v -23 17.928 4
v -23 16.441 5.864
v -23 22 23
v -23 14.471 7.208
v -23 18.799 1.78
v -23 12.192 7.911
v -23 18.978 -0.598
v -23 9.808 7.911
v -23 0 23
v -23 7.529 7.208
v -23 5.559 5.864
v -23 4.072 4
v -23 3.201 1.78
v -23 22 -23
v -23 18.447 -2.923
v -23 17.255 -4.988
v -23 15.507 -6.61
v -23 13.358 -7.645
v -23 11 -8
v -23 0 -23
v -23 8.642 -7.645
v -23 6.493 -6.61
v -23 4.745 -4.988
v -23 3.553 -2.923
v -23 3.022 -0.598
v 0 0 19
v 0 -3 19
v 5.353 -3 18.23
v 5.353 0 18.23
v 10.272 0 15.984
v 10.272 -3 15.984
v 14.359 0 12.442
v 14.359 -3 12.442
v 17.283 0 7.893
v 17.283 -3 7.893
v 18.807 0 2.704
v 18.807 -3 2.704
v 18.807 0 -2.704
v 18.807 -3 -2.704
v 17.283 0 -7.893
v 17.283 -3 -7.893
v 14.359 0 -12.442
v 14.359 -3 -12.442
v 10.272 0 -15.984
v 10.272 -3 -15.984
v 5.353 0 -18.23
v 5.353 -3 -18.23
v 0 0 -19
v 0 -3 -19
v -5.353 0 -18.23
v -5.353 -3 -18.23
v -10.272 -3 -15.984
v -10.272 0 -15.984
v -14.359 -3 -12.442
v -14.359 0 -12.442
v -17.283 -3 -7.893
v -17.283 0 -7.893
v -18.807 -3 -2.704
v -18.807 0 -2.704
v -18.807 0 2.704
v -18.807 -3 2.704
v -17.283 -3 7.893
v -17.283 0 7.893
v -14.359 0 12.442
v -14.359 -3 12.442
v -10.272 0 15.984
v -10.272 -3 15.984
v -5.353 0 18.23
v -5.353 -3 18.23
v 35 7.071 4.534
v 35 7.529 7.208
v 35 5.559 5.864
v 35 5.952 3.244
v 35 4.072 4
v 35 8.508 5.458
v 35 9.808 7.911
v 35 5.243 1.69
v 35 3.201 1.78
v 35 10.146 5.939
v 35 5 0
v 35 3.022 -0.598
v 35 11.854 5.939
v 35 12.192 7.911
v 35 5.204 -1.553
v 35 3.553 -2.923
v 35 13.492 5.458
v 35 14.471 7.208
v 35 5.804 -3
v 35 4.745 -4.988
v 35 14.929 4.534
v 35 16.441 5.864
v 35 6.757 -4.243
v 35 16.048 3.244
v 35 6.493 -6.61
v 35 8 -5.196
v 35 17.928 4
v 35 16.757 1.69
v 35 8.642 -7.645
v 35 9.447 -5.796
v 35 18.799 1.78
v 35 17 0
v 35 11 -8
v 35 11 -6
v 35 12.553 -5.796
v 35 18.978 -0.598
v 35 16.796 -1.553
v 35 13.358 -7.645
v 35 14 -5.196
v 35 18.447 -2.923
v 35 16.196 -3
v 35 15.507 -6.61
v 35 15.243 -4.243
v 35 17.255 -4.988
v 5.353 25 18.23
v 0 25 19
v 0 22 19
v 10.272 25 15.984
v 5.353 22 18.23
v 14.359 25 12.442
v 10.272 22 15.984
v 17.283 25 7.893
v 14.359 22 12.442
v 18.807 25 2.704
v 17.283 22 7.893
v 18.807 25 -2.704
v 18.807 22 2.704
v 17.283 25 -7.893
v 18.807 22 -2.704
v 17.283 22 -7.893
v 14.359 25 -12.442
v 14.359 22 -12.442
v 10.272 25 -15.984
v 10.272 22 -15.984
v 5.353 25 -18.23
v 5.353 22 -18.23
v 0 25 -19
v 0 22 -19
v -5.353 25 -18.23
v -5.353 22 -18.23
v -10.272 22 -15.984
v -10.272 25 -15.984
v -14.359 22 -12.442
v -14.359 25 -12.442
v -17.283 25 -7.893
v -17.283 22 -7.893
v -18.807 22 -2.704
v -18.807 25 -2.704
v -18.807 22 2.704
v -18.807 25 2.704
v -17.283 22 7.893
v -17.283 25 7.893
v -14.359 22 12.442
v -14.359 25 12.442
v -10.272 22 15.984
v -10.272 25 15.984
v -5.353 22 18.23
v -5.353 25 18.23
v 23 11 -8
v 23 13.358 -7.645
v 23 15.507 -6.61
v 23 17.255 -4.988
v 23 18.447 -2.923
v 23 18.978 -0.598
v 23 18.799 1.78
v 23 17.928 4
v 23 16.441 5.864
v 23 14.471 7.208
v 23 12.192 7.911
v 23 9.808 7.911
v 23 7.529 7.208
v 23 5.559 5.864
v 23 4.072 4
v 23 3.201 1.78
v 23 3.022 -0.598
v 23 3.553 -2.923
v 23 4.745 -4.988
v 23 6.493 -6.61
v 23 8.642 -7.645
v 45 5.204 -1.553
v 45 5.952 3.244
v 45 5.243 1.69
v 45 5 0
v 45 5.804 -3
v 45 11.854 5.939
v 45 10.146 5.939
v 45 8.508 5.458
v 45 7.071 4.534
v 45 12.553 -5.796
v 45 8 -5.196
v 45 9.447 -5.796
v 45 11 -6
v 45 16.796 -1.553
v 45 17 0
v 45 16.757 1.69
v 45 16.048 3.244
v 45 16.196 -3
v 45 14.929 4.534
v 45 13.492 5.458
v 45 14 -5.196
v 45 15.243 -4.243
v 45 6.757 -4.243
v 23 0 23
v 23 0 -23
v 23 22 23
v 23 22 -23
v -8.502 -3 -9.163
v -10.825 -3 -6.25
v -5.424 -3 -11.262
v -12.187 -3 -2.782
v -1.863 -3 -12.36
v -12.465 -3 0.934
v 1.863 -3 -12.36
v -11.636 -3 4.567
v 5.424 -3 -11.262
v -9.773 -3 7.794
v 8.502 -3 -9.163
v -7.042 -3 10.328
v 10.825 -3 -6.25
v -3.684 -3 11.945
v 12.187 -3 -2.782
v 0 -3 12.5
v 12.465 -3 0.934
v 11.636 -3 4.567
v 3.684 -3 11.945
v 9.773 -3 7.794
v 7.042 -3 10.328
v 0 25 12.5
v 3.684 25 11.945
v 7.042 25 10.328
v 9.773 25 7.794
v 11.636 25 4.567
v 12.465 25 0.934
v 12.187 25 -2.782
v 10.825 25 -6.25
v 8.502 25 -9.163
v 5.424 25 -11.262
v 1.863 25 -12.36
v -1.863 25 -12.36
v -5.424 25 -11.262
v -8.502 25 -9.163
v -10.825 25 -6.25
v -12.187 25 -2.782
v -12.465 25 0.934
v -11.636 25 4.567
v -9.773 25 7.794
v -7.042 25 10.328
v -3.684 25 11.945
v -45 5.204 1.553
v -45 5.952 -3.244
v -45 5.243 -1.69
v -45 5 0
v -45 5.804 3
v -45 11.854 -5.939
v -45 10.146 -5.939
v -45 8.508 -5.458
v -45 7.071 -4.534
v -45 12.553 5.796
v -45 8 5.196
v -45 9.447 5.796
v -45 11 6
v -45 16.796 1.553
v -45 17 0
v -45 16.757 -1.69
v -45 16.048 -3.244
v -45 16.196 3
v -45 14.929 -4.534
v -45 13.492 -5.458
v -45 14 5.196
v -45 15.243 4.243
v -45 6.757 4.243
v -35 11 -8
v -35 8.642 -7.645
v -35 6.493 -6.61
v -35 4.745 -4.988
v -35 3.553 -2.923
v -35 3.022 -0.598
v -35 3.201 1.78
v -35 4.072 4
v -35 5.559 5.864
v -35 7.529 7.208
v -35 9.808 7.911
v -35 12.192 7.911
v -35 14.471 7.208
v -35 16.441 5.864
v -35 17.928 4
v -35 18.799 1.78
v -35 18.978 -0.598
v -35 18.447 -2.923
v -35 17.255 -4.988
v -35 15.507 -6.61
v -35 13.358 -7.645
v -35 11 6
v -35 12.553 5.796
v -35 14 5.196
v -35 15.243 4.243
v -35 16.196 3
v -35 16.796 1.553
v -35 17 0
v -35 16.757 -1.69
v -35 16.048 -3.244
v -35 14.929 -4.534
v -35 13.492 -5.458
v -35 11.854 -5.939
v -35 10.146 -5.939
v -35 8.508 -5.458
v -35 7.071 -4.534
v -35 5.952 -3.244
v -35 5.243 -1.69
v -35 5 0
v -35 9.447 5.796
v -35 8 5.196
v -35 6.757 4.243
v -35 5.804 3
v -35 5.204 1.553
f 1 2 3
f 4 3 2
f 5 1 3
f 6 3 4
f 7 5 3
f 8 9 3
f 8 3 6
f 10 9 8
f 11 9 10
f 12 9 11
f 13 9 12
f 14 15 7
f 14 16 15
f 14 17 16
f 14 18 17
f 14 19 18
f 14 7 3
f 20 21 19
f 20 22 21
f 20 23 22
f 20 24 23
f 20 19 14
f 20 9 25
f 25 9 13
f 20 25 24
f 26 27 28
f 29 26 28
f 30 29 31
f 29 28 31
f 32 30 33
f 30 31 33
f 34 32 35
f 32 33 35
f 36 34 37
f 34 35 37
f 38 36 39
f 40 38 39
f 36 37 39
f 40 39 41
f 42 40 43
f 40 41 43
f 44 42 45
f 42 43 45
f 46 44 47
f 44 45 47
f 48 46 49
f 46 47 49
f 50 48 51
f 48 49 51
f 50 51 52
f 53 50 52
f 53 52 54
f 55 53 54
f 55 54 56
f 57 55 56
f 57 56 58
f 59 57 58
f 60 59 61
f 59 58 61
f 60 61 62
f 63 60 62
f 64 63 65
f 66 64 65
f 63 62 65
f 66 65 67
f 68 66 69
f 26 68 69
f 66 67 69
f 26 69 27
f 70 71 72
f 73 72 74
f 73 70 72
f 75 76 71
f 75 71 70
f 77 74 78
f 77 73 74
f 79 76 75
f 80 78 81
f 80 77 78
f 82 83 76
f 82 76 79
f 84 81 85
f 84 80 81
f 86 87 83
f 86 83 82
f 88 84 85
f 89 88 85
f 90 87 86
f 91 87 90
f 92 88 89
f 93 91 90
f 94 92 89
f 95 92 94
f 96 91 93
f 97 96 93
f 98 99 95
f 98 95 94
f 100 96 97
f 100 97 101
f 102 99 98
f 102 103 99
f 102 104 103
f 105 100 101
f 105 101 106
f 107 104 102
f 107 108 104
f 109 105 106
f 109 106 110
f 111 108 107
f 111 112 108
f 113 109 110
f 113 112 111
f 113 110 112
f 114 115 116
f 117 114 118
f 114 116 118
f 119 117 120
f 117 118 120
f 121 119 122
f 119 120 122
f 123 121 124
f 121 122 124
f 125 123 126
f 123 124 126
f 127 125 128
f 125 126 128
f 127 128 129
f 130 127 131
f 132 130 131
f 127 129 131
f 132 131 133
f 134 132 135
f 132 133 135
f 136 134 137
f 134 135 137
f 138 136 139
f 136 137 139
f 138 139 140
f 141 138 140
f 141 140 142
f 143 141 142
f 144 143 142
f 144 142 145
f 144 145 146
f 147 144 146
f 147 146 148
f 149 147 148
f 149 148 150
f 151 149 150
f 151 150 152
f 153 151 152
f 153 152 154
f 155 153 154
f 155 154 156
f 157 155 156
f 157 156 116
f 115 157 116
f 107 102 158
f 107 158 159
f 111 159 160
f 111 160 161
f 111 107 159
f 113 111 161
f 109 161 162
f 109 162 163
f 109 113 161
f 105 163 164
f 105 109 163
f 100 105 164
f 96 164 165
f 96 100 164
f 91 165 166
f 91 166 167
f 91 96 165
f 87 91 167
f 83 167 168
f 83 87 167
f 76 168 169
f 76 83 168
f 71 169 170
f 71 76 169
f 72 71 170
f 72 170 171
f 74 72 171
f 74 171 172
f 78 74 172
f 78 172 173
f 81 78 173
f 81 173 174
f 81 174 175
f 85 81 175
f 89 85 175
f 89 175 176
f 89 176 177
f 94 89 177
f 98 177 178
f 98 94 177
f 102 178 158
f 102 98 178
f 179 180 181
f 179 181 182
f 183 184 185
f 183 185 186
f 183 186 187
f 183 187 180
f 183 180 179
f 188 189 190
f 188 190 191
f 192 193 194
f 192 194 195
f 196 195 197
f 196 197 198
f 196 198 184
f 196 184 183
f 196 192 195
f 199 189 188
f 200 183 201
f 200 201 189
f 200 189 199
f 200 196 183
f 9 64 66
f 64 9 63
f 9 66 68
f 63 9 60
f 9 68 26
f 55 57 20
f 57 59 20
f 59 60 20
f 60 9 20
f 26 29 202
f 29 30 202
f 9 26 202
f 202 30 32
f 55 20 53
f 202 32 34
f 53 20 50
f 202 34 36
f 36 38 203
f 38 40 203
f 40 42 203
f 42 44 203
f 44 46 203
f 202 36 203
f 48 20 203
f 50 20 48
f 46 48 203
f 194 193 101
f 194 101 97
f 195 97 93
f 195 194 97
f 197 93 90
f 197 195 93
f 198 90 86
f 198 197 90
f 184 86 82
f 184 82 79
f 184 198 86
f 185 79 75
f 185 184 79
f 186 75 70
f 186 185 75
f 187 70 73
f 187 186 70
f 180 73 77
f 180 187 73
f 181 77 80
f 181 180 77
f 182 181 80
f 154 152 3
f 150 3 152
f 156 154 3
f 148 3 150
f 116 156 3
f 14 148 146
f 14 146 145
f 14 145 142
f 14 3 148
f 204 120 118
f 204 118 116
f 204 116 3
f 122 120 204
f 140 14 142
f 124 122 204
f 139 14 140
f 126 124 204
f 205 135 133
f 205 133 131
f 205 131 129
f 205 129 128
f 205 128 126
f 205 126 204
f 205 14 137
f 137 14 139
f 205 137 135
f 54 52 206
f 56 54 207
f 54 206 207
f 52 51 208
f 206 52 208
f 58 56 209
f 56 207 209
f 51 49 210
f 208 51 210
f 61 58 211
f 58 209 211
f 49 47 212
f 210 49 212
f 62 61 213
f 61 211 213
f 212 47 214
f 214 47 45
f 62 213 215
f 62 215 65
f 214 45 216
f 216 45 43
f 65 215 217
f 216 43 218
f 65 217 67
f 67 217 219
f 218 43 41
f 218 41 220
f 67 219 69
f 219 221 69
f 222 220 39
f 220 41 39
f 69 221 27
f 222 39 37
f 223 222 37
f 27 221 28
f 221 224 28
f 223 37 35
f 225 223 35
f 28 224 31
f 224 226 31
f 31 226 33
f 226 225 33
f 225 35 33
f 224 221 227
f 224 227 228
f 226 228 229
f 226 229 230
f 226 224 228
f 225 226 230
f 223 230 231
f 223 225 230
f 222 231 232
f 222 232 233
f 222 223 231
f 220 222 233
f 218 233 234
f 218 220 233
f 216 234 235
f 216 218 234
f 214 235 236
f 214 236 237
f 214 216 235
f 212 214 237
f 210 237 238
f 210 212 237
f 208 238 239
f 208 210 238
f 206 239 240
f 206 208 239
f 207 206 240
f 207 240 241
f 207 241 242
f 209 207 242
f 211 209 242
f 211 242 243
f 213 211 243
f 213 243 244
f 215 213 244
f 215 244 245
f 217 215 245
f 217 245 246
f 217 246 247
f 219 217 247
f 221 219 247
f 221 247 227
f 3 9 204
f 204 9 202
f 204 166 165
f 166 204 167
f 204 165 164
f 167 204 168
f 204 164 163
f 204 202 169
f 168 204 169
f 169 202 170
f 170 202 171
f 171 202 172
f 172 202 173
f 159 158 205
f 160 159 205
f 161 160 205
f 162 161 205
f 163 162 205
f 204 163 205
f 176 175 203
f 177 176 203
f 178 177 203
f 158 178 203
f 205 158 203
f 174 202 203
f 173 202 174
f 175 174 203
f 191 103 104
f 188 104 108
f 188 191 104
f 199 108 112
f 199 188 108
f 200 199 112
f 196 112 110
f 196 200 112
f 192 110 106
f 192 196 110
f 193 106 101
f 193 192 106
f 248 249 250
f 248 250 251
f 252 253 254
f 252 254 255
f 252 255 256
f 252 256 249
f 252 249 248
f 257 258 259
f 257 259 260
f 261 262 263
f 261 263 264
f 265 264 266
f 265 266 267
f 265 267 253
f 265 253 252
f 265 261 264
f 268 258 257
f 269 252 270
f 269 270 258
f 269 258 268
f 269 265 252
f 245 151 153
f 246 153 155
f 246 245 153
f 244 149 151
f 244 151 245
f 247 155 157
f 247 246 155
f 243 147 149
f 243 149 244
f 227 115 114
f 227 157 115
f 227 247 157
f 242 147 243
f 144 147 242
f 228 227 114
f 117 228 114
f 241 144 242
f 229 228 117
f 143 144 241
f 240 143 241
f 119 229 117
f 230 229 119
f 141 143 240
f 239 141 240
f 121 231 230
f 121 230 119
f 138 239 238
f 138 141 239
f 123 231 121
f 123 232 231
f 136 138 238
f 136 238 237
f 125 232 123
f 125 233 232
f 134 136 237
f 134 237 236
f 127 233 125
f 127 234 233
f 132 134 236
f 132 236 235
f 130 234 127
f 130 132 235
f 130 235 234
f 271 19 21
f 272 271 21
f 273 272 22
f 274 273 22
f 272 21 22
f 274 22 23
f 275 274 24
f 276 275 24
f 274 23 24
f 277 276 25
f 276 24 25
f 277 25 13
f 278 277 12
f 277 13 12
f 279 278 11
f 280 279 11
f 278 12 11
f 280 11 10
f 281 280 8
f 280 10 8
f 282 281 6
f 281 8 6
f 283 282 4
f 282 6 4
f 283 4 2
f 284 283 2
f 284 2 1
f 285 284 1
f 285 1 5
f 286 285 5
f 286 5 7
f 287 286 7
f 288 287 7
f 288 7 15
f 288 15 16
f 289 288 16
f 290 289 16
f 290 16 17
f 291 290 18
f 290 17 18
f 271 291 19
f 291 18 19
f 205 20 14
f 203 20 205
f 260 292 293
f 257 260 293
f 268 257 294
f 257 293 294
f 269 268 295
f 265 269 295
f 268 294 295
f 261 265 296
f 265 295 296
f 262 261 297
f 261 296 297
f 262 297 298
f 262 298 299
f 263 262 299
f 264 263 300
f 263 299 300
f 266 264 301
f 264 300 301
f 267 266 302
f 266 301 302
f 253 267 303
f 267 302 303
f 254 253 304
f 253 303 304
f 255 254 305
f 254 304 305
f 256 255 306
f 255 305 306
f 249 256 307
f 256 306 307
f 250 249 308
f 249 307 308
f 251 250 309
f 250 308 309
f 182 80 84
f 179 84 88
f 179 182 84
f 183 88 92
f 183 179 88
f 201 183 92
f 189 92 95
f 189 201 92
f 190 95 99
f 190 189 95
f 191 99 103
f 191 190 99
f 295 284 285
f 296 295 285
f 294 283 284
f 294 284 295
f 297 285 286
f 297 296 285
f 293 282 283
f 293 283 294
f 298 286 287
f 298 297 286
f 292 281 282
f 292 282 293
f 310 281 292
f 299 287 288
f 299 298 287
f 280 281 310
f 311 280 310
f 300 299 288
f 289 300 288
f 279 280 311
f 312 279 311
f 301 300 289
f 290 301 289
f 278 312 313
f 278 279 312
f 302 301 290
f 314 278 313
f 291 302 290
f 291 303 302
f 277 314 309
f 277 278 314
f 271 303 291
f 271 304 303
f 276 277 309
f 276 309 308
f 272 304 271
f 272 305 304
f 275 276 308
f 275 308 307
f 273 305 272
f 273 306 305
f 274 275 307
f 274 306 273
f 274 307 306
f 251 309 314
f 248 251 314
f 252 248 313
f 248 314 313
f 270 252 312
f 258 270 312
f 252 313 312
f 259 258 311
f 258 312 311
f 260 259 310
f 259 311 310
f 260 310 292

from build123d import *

# Parameters (mm, degrees)
ESBO_O1_W                 = 46
ESBO_O1_H                 = 46
ESBO_O1_R                 = 12.5
RESSALTO_EXTRUS_O1_DEPTH  = 22
ESBO_O1_7_R               = 19
ESBO_O1_7_R_2             = 12.5
RESSALTO_EXTRUS_O4_DEPTH  = 25
RESSALTO_EXTRUS_O5_START  = -3
ESBO_O1_8_R               = 19
ESBO_O1_8_R_2             = 12.5
RESSALTO_EXTRUS_O5_DEPTH  = 3
ESBO_O7_R                 = 8
ESBO_O7_R_2               = 6
RESSALTO_EXTRUS_O8_DEPTH  = 12
ESBO_O7_3_R               = 6
RESSALTO_EXTRUS_O9_DEPTH  = 22
RESSALTO_EXTRUS_O10_START = 12
ESBO_O8_R                 = 8
ESBO_O8_R_2               = 6
RESSALTO_EXTRUS_O10_DEPTH = 12
RESSALTO_EXTRUS_O11_START = 22
ESBO_O8_2_R               = 6
RESSALTO_EXTRUS_O11_DEPTH = 22


with BuildPart() as part:
    # Esboço1 → Ressalto-extrusão1 (new body)
    with BuildSketch(Plane(origin=(0, 0, 0), x_dir=(1, 0, 0), z_dir=(0, 1, 0))):
        Rectangle(ESBO_O1_W, ESBO_O1_H)
        Circle(ESBO_O1_R, mode=Mode.SUBTRACT)
    extrude(amount=RESSALTO_EXTRUS_O1_DEPTH)

    # Esboço1<7> → Ressalto-extrusão4 (add)
    with BuildSketch(Plane(origin=(0, 0, 0), x_dir=(1, 0, 0), z_dir=(0, 1, 0))):
        Circle(ESBO_O1_7_R)
        Circle(ESBO_O1_7_R_2, mode=Mode.SUBTRACT)
    extrude(amount=RESSALTO_EXTRUS_O4_DEPTH)

    # Esboço1<8> → Ressalto-extrusão5 (add)
    with BuildSketch(Plane(origin=(0, 0, 0), x_dir=(1, 0, 0), z_dir=(0, 1, 0)).offset(RESSALTO_EXTRUS_O5_START)):
        Circle(ESBO_O1_8_R)
        Circle(ESBO_O1_8_R_2, mode=Mode.SUBTRACT)
    extrude(amount=RESSALTO_EXTRUS_O5_DEPTH)

    # Esboço7 → Ressalto-extrusão8 (add)
    with BuildSketch(Plane.ZY.offset(23)):
        with Locations((0, 11)):
            Circle(ESBO_O7_R)
        with Locations((0, 11)):
            Circle(ESBO_O7_R_2, mode=Mode.SUBTRACT)
    extrude(amount=RESSALTO_EXTRUS_O8_DEPTH)

    # Esboço7<3> → Ressalto-extrusão9 (add)
    with BuildSketch(Plane.ZY.offset(23)):
        with Locations((0, 11)):
            Circle(ESBO_O7_3_R)
    extrude(amount=RESSALTO_EXTRUS_O9_DEPTH)

    # Esboço8 → Ressalto-extrusão10 (add)
    with BuildSketch(Plane(origin=(23, 0, 0), x_dir=(0, 0, -1), z_dir=(1, 0, 0)).offset(RESSALTO_EXTRUS_O10_START)):
        with Locations((0, 11)):
            Circle(ESBO_O8_R)
        with Locations((0, 11)):
            Circle(ESBO_O8_R_2, mode=Mode.SUBTRACT)
    extrude(amount=-RESSALTO_EXTRUS_O10_DEPTH)

    # Esboço8<2> → Ressalto-extrusão11 (add)
    with BuildSketch(Plane(origin=(23, 0, 0), x_dir=(0, 0, -1), z_dir=(1, 0, 0)).offset(RESSALTO_EXTRUS_O11_START)):
        with Locations((0, 11)):
            Circle(ESBO_O8_2_R)
    extrude(amount=-RESSALTO_EXTRUS_O11_DEPTH)


solid = part.part
